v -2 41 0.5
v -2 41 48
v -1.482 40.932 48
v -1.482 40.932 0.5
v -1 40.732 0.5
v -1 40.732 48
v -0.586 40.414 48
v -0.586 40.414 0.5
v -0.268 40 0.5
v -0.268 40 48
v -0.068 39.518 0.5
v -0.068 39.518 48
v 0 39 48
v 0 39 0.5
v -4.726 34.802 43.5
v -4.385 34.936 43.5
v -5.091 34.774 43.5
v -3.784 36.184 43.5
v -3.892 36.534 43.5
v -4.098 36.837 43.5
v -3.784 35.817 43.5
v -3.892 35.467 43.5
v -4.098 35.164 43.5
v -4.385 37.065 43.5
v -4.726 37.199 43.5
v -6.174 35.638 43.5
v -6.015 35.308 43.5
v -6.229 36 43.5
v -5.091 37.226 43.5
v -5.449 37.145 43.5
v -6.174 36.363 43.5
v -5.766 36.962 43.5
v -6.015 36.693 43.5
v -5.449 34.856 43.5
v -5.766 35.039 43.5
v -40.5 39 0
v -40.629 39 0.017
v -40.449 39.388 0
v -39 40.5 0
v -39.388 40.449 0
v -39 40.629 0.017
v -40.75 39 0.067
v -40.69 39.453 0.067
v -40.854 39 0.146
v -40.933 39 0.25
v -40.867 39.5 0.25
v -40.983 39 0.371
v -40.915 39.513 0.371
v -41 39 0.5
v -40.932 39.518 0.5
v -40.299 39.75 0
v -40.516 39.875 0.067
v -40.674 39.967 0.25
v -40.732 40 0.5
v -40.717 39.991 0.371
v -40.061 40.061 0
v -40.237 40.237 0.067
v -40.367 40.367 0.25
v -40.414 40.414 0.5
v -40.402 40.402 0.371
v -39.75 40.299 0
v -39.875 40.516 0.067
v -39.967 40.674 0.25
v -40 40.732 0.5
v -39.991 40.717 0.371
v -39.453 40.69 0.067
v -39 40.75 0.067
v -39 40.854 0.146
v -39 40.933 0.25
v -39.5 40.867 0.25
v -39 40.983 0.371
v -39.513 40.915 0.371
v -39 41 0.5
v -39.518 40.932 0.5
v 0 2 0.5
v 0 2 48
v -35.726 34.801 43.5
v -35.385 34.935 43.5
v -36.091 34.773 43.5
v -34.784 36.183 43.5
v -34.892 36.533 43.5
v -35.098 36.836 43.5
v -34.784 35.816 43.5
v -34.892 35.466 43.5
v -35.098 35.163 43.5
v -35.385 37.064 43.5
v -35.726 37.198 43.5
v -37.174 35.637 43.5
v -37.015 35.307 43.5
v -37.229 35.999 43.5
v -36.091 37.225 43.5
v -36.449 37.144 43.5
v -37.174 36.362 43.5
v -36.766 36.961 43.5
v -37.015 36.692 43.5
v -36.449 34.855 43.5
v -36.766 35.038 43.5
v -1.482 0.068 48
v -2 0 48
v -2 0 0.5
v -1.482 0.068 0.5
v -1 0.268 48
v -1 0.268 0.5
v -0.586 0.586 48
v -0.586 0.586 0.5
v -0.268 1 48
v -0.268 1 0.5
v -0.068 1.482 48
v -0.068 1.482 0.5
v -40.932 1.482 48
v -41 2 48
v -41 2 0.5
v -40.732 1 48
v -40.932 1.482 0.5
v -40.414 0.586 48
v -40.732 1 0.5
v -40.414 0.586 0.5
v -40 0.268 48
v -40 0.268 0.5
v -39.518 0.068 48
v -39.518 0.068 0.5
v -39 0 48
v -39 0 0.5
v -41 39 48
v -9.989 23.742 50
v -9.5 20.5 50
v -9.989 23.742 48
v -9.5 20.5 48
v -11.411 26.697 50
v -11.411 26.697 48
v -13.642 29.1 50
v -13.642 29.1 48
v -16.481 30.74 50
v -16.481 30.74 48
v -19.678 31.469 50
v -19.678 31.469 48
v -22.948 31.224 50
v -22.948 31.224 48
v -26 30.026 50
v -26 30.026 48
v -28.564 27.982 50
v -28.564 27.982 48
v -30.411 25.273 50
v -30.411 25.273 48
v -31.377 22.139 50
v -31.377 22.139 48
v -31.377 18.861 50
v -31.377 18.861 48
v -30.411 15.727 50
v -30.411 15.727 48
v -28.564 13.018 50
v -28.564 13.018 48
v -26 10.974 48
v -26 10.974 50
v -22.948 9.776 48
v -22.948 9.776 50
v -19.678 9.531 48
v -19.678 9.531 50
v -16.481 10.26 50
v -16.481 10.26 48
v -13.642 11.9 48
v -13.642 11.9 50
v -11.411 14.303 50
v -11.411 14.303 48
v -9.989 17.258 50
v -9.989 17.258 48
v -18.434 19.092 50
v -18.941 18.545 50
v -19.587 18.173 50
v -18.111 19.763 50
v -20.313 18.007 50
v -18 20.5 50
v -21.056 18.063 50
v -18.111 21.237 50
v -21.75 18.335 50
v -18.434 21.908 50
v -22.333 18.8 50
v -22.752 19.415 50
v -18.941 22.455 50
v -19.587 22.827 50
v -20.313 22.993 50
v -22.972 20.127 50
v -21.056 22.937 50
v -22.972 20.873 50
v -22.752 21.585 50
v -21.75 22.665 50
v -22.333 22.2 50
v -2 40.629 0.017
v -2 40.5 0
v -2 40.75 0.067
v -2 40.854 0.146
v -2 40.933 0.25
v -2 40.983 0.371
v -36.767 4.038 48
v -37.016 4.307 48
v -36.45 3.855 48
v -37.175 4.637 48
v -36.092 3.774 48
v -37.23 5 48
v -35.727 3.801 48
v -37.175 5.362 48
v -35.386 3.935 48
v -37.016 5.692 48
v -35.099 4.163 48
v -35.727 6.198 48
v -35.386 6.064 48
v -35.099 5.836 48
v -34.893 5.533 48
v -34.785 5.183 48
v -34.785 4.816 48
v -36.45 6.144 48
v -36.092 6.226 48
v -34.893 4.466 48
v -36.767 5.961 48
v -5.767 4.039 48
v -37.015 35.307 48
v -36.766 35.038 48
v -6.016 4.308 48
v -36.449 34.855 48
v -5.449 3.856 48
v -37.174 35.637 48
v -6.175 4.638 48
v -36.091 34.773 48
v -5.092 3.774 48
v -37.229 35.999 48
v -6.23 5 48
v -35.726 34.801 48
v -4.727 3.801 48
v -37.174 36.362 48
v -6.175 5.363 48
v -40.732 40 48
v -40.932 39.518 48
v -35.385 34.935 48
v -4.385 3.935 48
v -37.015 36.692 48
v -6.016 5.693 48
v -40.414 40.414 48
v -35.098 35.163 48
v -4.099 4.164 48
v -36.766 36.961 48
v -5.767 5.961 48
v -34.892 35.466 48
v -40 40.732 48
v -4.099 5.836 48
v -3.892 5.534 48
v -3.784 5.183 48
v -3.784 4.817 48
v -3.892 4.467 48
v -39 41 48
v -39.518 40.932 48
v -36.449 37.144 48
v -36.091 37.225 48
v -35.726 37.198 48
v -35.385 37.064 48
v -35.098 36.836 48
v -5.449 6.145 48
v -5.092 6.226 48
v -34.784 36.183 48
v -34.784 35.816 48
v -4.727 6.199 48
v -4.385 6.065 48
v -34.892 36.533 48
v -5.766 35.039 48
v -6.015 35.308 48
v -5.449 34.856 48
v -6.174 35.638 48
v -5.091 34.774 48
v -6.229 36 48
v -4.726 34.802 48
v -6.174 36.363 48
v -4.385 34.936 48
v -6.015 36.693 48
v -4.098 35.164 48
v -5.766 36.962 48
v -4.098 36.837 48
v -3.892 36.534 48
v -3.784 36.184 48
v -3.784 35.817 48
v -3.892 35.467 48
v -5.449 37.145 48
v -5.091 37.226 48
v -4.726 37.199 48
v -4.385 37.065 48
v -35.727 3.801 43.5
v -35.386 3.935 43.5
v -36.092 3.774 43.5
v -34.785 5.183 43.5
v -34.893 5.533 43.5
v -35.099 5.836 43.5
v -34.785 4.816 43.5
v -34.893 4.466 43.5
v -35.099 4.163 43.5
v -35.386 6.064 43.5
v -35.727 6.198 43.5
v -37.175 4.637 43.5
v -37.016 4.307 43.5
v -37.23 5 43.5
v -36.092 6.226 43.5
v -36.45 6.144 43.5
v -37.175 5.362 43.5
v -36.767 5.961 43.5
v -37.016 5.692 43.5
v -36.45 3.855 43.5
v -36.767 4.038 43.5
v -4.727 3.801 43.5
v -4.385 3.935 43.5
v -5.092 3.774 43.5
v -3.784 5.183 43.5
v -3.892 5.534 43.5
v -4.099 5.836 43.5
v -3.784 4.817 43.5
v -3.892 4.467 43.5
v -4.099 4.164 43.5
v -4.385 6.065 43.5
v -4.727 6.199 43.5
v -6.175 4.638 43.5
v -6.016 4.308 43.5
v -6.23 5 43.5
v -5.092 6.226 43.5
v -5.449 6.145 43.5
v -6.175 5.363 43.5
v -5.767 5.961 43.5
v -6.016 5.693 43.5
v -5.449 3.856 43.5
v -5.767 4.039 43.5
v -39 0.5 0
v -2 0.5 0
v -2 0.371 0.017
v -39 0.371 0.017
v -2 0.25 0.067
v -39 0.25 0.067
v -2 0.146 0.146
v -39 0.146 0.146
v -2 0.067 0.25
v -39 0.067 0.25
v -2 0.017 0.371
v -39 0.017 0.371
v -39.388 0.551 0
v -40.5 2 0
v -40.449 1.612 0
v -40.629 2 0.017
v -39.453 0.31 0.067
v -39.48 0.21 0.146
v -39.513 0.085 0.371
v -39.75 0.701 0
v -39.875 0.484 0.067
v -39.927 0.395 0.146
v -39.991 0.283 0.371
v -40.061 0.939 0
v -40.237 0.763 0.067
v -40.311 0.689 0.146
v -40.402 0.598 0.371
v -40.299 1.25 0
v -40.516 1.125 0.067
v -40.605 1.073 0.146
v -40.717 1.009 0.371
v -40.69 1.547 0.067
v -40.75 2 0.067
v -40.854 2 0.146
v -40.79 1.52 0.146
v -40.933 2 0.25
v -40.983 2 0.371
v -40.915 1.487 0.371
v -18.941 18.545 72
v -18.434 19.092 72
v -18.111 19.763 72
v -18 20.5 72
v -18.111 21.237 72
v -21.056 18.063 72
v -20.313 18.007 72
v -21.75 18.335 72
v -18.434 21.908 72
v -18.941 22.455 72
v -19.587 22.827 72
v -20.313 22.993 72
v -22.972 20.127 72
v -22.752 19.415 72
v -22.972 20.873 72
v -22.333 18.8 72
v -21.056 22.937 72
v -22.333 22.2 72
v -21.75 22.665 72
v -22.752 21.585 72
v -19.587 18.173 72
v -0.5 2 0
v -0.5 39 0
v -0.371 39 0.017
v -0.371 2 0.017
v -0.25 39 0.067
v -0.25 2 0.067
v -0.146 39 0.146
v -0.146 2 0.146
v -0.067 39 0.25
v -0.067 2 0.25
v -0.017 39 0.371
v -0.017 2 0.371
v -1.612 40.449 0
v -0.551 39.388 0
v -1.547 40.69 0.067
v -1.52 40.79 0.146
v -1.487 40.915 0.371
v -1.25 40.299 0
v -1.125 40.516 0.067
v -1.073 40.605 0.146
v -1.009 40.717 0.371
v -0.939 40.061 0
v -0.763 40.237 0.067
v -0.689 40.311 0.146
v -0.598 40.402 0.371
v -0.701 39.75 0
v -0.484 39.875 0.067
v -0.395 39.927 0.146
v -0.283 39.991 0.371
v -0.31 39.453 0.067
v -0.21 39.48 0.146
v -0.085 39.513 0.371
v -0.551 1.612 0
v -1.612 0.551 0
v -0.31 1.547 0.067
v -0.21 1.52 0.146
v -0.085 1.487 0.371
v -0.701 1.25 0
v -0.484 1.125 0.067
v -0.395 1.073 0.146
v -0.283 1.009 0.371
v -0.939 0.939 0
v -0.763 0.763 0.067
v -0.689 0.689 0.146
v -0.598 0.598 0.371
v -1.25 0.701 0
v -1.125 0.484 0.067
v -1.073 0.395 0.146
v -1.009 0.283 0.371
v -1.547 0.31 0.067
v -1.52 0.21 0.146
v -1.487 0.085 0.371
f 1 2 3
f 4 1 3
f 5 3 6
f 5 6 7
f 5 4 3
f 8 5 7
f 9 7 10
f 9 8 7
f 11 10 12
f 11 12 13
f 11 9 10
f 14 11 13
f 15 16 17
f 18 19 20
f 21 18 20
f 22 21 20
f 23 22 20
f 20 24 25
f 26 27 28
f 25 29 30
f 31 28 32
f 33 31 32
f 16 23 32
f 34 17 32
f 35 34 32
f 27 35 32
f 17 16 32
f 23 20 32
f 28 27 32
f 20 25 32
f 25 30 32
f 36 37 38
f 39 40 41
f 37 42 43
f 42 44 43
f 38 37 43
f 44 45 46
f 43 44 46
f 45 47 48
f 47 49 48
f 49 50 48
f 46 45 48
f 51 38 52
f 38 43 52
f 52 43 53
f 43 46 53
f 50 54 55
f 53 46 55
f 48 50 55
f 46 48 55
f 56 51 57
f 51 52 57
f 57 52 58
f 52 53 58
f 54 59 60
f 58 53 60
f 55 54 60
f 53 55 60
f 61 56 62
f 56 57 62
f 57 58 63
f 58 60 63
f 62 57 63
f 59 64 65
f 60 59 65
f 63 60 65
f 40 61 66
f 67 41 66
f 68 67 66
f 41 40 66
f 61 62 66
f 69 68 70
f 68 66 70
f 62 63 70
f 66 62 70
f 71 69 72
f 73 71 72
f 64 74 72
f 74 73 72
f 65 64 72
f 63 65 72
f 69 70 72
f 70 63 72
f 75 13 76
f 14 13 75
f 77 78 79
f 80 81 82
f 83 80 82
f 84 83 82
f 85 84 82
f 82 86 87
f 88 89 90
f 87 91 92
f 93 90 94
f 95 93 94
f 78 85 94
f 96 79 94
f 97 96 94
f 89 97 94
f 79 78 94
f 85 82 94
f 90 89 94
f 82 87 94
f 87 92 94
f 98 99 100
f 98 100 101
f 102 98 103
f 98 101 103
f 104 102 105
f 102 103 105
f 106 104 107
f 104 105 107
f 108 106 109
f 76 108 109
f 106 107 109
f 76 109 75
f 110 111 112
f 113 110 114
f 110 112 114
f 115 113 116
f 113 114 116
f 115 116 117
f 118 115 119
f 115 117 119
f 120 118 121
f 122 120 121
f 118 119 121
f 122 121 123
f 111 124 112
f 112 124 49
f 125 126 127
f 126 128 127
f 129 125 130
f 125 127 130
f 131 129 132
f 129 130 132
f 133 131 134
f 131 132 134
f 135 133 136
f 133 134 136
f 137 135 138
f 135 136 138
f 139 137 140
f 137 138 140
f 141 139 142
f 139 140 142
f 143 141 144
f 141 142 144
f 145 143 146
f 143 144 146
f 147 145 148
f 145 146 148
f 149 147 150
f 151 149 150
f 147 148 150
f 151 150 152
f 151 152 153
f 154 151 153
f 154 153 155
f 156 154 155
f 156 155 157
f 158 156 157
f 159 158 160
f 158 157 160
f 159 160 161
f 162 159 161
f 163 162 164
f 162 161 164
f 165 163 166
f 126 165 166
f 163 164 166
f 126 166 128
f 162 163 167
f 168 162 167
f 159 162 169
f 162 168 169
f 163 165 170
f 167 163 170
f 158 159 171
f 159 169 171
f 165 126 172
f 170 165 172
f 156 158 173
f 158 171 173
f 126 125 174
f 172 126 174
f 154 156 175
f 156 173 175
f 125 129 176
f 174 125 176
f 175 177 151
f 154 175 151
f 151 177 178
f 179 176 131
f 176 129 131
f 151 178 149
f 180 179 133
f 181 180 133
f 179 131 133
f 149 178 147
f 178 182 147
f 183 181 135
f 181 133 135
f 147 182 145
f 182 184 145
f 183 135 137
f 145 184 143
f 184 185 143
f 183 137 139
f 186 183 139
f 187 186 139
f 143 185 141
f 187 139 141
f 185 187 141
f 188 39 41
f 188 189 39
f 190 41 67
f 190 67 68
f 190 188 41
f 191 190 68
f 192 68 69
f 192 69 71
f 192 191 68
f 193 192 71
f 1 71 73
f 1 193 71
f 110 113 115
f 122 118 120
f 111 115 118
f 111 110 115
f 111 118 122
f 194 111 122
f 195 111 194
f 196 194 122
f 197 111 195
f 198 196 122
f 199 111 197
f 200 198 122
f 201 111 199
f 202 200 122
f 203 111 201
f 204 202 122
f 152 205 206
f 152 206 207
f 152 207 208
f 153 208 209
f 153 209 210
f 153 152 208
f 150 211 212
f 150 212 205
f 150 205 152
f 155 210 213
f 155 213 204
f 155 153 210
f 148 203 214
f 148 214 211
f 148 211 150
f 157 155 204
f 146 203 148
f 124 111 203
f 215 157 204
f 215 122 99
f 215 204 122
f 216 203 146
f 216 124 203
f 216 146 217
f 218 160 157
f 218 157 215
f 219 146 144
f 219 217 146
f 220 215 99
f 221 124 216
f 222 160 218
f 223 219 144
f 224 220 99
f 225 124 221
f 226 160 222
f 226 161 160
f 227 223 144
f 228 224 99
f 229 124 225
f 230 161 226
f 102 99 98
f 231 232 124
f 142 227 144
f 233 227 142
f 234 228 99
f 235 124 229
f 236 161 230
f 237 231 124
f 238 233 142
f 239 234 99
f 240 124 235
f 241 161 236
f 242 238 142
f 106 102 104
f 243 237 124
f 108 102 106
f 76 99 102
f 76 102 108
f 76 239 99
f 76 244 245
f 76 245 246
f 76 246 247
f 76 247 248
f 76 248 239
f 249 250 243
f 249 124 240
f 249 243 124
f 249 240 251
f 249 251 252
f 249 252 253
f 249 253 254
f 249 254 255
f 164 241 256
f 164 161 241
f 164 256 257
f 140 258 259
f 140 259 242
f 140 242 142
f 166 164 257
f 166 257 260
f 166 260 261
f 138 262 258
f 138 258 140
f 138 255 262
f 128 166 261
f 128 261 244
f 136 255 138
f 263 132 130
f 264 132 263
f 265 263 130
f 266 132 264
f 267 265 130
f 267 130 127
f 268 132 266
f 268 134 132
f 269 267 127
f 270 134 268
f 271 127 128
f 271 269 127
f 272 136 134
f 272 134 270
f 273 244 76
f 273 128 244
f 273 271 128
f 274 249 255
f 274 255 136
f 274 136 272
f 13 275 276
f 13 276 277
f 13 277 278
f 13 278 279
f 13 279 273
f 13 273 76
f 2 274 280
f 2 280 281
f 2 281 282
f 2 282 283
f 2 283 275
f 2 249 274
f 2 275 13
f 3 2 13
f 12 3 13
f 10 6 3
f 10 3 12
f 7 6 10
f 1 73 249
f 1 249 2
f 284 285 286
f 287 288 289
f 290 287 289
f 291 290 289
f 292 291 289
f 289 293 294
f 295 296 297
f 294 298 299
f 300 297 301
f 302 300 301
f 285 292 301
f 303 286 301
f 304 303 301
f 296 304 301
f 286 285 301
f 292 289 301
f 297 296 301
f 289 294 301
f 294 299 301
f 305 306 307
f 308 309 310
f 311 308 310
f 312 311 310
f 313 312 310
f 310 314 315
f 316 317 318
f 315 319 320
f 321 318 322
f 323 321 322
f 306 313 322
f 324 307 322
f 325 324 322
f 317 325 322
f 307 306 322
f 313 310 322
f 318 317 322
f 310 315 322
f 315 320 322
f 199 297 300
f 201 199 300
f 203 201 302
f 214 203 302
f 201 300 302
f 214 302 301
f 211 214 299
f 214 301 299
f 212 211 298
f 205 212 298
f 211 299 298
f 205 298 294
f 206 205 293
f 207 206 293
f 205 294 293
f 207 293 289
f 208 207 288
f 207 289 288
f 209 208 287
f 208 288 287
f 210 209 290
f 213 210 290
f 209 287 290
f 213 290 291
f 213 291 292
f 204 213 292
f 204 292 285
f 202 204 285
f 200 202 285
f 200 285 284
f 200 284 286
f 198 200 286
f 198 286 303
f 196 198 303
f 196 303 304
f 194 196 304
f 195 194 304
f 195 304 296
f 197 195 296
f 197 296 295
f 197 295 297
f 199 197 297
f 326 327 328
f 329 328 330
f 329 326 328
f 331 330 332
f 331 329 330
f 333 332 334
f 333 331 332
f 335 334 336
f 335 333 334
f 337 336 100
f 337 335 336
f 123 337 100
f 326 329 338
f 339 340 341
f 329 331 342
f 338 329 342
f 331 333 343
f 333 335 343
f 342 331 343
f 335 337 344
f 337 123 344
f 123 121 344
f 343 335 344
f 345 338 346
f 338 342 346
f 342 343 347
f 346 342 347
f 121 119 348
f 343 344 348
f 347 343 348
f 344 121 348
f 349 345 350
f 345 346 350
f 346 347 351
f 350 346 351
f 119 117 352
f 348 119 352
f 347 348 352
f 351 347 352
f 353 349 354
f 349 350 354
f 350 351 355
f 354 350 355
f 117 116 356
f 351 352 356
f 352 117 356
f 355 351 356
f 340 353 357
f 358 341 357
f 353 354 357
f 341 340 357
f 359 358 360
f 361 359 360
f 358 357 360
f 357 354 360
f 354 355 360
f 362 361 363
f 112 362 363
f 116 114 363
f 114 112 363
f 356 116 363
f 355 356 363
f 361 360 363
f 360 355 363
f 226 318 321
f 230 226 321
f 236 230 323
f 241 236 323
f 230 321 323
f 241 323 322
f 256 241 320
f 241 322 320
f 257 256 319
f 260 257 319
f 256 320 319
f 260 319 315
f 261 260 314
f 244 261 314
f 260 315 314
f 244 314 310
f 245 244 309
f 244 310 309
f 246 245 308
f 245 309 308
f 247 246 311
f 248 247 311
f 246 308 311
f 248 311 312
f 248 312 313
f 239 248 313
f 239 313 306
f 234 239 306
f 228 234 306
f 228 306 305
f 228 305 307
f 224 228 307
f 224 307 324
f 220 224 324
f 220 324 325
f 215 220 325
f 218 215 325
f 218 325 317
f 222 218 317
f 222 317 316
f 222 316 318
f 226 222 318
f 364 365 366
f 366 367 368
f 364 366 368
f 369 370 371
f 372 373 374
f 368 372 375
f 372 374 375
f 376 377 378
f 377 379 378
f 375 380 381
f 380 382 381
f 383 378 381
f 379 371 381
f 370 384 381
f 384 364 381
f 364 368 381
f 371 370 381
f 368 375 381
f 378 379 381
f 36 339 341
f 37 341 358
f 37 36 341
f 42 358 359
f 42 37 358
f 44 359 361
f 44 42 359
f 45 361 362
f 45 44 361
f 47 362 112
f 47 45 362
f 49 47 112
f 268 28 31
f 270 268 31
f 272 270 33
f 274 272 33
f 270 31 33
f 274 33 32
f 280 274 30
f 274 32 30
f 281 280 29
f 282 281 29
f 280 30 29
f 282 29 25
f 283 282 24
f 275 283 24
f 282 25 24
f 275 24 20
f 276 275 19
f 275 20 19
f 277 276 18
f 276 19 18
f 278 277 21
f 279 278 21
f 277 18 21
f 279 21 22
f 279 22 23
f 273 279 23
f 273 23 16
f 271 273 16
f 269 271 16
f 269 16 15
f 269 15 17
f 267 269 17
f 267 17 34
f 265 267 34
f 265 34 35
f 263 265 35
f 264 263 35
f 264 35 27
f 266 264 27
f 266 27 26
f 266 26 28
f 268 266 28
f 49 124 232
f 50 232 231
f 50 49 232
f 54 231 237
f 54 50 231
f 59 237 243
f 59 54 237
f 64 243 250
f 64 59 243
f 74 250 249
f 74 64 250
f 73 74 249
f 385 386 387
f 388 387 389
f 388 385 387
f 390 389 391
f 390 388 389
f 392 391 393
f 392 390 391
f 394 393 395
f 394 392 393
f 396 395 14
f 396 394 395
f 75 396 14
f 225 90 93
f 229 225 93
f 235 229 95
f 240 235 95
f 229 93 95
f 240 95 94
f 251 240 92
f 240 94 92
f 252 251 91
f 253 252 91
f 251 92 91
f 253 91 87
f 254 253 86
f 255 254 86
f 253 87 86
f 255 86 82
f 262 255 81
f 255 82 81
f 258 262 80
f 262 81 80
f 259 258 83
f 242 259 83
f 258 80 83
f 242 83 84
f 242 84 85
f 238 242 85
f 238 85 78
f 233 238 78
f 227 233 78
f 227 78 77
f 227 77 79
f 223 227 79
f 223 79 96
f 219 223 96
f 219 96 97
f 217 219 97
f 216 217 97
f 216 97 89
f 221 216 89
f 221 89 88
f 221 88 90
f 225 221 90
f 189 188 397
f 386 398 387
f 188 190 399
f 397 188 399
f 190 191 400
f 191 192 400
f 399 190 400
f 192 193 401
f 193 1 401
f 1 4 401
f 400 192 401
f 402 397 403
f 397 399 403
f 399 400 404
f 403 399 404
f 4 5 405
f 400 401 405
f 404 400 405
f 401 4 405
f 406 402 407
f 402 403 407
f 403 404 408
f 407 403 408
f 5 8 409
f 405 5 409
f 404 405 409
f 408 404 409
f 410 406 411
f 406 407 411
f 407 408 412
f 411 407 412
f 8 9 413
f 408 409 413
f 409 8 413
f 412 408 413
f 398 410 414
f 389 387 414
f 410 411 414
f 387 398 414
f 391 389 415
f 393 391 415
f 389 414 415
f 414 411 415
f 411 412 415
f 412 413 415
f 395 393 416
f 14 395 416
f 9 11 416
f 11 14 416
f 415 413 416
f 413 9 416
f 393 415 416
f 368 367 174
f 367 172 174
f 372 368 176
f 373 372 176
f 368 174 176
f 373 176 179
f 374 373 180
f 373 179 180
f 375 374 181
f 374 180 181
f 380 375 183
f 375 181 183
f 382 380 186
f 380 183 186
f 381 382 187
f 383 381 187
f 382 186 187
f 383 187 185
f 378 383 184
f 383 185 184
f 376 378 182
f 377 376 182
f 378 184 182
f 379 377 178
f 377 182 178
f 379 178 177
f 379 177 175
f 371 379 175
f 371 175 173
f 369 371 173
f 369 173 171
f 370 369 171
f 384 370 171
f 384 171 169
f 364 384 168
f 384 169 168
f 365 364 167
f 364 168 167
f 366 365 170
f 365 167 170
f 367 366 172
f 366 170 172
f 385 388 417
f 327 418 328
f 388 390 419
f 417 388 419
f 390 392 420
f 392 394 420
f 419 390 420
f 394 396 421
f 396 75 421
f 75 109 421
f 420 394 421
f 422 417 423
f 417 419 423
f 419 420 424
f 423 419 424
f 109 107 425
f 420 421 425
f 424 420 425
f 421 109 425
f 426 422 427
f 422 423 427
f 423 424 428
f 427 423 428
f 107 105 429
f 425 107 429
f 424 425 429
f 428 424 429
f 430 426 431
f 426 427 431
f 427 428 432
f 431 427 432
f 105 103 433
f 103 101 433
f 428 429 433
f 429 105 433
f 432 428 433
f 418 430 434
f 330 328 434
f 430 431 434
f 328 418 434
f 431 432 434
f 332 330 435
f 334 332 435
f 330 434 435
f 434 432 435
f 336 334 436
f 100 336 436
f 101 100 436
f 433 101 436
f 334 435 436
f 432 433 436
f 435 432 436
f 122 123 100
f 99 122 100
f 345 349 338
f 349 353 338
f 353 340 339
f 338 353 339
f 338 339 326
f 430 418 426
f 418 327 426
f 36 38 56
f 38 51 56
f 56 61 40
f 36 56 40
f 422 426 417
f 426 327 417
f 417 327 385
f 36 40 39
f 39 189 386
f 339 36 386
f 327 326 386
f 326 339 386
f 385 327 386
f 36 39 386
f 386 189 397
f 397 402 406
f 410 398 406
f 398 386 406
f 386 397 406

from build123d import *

# Parameters (mm, degrees)
SKETCH1_W                = 41
SKETCH1_H                = 48
BOSS_EXTRUDE1_DEPTH      = 41
M2_CLEARANCE_HOLE1_D     = 2.459
M2_CLEARANCE_HOLE1_DEPTH = 4.5
FILLET1_R                = 2
FILLET2_R                = 0.5


with BuildPart() as part:
    # Sketch1 → Boss-Extrude1 (new body)
    with BuildSketch(Plane(origin=(0, 41, 0), x_dir=(1, 0, 0), z_dir=(0, 1, 0))):
        with Locations((-20.5, -24)):
            Rectangle(SKETCH1_W, SKETCH1_H)
    extrude(amount=-BOSS_EXTRUDE1_DEPTH)

    # Sketch2 → Revolve1 (revolve)
    with BuildSketch(Plane(origin=(0, 20.5, 0), x_dir=(1, 0, 0), z_dir=(0, 1, 0))):
        Polygon((-9.5, -48), (-20.5, -48), (-20.5, -72), (-18, -72), (-18, -50), (-9.5, -50), align=None)
    revolve(axis=Axis((-20.5, 20.5, 48), (0, 0, 1)))

    # M2 Clearance Hole1
    with Locations(Plane.XY.offset(48)):
        with Locations((-36.000338928, 4.999660985), (-5.000129304, 5.00012938), (-4.999606235, 36.000393851), (-35.999364901, 35.999364804)):
            Hole(M2_CLEARANCE_HOLE1_D / 2, depth=M2_CLEARANCE_HOLE1_DEPTH)

    # Fillet1
    fillet1_edges = [part.edges().sort_by_distance(p)[0] for p in [
        (0, 0, 24),
        (-41, 0, 24),
        (0, 41, 24),
        (-41, 41, 24),
    ]]
    fillet(fillet1_edges, radius=FILLET1_R)

    # Fillet2
    fillet2_edges = [part.edges().sort_by_distance(p)[0] for p in [
        (-20.5, 41, 0),
        (-41, 20.5, 0),
        (0, 20.5, 0),
        (-20.5, 0, 0),
        (-0.585786438, 0.585786438, 0),
        (-40.414213562, 0.585786438, 0),
        (-0.585786438, 40.414213562, 0),
        (-40.414213562, 40.414213562, 0),
    ]]
    fillet(fillet2_edges, radius=FILLET2_R)


solid = part.part
